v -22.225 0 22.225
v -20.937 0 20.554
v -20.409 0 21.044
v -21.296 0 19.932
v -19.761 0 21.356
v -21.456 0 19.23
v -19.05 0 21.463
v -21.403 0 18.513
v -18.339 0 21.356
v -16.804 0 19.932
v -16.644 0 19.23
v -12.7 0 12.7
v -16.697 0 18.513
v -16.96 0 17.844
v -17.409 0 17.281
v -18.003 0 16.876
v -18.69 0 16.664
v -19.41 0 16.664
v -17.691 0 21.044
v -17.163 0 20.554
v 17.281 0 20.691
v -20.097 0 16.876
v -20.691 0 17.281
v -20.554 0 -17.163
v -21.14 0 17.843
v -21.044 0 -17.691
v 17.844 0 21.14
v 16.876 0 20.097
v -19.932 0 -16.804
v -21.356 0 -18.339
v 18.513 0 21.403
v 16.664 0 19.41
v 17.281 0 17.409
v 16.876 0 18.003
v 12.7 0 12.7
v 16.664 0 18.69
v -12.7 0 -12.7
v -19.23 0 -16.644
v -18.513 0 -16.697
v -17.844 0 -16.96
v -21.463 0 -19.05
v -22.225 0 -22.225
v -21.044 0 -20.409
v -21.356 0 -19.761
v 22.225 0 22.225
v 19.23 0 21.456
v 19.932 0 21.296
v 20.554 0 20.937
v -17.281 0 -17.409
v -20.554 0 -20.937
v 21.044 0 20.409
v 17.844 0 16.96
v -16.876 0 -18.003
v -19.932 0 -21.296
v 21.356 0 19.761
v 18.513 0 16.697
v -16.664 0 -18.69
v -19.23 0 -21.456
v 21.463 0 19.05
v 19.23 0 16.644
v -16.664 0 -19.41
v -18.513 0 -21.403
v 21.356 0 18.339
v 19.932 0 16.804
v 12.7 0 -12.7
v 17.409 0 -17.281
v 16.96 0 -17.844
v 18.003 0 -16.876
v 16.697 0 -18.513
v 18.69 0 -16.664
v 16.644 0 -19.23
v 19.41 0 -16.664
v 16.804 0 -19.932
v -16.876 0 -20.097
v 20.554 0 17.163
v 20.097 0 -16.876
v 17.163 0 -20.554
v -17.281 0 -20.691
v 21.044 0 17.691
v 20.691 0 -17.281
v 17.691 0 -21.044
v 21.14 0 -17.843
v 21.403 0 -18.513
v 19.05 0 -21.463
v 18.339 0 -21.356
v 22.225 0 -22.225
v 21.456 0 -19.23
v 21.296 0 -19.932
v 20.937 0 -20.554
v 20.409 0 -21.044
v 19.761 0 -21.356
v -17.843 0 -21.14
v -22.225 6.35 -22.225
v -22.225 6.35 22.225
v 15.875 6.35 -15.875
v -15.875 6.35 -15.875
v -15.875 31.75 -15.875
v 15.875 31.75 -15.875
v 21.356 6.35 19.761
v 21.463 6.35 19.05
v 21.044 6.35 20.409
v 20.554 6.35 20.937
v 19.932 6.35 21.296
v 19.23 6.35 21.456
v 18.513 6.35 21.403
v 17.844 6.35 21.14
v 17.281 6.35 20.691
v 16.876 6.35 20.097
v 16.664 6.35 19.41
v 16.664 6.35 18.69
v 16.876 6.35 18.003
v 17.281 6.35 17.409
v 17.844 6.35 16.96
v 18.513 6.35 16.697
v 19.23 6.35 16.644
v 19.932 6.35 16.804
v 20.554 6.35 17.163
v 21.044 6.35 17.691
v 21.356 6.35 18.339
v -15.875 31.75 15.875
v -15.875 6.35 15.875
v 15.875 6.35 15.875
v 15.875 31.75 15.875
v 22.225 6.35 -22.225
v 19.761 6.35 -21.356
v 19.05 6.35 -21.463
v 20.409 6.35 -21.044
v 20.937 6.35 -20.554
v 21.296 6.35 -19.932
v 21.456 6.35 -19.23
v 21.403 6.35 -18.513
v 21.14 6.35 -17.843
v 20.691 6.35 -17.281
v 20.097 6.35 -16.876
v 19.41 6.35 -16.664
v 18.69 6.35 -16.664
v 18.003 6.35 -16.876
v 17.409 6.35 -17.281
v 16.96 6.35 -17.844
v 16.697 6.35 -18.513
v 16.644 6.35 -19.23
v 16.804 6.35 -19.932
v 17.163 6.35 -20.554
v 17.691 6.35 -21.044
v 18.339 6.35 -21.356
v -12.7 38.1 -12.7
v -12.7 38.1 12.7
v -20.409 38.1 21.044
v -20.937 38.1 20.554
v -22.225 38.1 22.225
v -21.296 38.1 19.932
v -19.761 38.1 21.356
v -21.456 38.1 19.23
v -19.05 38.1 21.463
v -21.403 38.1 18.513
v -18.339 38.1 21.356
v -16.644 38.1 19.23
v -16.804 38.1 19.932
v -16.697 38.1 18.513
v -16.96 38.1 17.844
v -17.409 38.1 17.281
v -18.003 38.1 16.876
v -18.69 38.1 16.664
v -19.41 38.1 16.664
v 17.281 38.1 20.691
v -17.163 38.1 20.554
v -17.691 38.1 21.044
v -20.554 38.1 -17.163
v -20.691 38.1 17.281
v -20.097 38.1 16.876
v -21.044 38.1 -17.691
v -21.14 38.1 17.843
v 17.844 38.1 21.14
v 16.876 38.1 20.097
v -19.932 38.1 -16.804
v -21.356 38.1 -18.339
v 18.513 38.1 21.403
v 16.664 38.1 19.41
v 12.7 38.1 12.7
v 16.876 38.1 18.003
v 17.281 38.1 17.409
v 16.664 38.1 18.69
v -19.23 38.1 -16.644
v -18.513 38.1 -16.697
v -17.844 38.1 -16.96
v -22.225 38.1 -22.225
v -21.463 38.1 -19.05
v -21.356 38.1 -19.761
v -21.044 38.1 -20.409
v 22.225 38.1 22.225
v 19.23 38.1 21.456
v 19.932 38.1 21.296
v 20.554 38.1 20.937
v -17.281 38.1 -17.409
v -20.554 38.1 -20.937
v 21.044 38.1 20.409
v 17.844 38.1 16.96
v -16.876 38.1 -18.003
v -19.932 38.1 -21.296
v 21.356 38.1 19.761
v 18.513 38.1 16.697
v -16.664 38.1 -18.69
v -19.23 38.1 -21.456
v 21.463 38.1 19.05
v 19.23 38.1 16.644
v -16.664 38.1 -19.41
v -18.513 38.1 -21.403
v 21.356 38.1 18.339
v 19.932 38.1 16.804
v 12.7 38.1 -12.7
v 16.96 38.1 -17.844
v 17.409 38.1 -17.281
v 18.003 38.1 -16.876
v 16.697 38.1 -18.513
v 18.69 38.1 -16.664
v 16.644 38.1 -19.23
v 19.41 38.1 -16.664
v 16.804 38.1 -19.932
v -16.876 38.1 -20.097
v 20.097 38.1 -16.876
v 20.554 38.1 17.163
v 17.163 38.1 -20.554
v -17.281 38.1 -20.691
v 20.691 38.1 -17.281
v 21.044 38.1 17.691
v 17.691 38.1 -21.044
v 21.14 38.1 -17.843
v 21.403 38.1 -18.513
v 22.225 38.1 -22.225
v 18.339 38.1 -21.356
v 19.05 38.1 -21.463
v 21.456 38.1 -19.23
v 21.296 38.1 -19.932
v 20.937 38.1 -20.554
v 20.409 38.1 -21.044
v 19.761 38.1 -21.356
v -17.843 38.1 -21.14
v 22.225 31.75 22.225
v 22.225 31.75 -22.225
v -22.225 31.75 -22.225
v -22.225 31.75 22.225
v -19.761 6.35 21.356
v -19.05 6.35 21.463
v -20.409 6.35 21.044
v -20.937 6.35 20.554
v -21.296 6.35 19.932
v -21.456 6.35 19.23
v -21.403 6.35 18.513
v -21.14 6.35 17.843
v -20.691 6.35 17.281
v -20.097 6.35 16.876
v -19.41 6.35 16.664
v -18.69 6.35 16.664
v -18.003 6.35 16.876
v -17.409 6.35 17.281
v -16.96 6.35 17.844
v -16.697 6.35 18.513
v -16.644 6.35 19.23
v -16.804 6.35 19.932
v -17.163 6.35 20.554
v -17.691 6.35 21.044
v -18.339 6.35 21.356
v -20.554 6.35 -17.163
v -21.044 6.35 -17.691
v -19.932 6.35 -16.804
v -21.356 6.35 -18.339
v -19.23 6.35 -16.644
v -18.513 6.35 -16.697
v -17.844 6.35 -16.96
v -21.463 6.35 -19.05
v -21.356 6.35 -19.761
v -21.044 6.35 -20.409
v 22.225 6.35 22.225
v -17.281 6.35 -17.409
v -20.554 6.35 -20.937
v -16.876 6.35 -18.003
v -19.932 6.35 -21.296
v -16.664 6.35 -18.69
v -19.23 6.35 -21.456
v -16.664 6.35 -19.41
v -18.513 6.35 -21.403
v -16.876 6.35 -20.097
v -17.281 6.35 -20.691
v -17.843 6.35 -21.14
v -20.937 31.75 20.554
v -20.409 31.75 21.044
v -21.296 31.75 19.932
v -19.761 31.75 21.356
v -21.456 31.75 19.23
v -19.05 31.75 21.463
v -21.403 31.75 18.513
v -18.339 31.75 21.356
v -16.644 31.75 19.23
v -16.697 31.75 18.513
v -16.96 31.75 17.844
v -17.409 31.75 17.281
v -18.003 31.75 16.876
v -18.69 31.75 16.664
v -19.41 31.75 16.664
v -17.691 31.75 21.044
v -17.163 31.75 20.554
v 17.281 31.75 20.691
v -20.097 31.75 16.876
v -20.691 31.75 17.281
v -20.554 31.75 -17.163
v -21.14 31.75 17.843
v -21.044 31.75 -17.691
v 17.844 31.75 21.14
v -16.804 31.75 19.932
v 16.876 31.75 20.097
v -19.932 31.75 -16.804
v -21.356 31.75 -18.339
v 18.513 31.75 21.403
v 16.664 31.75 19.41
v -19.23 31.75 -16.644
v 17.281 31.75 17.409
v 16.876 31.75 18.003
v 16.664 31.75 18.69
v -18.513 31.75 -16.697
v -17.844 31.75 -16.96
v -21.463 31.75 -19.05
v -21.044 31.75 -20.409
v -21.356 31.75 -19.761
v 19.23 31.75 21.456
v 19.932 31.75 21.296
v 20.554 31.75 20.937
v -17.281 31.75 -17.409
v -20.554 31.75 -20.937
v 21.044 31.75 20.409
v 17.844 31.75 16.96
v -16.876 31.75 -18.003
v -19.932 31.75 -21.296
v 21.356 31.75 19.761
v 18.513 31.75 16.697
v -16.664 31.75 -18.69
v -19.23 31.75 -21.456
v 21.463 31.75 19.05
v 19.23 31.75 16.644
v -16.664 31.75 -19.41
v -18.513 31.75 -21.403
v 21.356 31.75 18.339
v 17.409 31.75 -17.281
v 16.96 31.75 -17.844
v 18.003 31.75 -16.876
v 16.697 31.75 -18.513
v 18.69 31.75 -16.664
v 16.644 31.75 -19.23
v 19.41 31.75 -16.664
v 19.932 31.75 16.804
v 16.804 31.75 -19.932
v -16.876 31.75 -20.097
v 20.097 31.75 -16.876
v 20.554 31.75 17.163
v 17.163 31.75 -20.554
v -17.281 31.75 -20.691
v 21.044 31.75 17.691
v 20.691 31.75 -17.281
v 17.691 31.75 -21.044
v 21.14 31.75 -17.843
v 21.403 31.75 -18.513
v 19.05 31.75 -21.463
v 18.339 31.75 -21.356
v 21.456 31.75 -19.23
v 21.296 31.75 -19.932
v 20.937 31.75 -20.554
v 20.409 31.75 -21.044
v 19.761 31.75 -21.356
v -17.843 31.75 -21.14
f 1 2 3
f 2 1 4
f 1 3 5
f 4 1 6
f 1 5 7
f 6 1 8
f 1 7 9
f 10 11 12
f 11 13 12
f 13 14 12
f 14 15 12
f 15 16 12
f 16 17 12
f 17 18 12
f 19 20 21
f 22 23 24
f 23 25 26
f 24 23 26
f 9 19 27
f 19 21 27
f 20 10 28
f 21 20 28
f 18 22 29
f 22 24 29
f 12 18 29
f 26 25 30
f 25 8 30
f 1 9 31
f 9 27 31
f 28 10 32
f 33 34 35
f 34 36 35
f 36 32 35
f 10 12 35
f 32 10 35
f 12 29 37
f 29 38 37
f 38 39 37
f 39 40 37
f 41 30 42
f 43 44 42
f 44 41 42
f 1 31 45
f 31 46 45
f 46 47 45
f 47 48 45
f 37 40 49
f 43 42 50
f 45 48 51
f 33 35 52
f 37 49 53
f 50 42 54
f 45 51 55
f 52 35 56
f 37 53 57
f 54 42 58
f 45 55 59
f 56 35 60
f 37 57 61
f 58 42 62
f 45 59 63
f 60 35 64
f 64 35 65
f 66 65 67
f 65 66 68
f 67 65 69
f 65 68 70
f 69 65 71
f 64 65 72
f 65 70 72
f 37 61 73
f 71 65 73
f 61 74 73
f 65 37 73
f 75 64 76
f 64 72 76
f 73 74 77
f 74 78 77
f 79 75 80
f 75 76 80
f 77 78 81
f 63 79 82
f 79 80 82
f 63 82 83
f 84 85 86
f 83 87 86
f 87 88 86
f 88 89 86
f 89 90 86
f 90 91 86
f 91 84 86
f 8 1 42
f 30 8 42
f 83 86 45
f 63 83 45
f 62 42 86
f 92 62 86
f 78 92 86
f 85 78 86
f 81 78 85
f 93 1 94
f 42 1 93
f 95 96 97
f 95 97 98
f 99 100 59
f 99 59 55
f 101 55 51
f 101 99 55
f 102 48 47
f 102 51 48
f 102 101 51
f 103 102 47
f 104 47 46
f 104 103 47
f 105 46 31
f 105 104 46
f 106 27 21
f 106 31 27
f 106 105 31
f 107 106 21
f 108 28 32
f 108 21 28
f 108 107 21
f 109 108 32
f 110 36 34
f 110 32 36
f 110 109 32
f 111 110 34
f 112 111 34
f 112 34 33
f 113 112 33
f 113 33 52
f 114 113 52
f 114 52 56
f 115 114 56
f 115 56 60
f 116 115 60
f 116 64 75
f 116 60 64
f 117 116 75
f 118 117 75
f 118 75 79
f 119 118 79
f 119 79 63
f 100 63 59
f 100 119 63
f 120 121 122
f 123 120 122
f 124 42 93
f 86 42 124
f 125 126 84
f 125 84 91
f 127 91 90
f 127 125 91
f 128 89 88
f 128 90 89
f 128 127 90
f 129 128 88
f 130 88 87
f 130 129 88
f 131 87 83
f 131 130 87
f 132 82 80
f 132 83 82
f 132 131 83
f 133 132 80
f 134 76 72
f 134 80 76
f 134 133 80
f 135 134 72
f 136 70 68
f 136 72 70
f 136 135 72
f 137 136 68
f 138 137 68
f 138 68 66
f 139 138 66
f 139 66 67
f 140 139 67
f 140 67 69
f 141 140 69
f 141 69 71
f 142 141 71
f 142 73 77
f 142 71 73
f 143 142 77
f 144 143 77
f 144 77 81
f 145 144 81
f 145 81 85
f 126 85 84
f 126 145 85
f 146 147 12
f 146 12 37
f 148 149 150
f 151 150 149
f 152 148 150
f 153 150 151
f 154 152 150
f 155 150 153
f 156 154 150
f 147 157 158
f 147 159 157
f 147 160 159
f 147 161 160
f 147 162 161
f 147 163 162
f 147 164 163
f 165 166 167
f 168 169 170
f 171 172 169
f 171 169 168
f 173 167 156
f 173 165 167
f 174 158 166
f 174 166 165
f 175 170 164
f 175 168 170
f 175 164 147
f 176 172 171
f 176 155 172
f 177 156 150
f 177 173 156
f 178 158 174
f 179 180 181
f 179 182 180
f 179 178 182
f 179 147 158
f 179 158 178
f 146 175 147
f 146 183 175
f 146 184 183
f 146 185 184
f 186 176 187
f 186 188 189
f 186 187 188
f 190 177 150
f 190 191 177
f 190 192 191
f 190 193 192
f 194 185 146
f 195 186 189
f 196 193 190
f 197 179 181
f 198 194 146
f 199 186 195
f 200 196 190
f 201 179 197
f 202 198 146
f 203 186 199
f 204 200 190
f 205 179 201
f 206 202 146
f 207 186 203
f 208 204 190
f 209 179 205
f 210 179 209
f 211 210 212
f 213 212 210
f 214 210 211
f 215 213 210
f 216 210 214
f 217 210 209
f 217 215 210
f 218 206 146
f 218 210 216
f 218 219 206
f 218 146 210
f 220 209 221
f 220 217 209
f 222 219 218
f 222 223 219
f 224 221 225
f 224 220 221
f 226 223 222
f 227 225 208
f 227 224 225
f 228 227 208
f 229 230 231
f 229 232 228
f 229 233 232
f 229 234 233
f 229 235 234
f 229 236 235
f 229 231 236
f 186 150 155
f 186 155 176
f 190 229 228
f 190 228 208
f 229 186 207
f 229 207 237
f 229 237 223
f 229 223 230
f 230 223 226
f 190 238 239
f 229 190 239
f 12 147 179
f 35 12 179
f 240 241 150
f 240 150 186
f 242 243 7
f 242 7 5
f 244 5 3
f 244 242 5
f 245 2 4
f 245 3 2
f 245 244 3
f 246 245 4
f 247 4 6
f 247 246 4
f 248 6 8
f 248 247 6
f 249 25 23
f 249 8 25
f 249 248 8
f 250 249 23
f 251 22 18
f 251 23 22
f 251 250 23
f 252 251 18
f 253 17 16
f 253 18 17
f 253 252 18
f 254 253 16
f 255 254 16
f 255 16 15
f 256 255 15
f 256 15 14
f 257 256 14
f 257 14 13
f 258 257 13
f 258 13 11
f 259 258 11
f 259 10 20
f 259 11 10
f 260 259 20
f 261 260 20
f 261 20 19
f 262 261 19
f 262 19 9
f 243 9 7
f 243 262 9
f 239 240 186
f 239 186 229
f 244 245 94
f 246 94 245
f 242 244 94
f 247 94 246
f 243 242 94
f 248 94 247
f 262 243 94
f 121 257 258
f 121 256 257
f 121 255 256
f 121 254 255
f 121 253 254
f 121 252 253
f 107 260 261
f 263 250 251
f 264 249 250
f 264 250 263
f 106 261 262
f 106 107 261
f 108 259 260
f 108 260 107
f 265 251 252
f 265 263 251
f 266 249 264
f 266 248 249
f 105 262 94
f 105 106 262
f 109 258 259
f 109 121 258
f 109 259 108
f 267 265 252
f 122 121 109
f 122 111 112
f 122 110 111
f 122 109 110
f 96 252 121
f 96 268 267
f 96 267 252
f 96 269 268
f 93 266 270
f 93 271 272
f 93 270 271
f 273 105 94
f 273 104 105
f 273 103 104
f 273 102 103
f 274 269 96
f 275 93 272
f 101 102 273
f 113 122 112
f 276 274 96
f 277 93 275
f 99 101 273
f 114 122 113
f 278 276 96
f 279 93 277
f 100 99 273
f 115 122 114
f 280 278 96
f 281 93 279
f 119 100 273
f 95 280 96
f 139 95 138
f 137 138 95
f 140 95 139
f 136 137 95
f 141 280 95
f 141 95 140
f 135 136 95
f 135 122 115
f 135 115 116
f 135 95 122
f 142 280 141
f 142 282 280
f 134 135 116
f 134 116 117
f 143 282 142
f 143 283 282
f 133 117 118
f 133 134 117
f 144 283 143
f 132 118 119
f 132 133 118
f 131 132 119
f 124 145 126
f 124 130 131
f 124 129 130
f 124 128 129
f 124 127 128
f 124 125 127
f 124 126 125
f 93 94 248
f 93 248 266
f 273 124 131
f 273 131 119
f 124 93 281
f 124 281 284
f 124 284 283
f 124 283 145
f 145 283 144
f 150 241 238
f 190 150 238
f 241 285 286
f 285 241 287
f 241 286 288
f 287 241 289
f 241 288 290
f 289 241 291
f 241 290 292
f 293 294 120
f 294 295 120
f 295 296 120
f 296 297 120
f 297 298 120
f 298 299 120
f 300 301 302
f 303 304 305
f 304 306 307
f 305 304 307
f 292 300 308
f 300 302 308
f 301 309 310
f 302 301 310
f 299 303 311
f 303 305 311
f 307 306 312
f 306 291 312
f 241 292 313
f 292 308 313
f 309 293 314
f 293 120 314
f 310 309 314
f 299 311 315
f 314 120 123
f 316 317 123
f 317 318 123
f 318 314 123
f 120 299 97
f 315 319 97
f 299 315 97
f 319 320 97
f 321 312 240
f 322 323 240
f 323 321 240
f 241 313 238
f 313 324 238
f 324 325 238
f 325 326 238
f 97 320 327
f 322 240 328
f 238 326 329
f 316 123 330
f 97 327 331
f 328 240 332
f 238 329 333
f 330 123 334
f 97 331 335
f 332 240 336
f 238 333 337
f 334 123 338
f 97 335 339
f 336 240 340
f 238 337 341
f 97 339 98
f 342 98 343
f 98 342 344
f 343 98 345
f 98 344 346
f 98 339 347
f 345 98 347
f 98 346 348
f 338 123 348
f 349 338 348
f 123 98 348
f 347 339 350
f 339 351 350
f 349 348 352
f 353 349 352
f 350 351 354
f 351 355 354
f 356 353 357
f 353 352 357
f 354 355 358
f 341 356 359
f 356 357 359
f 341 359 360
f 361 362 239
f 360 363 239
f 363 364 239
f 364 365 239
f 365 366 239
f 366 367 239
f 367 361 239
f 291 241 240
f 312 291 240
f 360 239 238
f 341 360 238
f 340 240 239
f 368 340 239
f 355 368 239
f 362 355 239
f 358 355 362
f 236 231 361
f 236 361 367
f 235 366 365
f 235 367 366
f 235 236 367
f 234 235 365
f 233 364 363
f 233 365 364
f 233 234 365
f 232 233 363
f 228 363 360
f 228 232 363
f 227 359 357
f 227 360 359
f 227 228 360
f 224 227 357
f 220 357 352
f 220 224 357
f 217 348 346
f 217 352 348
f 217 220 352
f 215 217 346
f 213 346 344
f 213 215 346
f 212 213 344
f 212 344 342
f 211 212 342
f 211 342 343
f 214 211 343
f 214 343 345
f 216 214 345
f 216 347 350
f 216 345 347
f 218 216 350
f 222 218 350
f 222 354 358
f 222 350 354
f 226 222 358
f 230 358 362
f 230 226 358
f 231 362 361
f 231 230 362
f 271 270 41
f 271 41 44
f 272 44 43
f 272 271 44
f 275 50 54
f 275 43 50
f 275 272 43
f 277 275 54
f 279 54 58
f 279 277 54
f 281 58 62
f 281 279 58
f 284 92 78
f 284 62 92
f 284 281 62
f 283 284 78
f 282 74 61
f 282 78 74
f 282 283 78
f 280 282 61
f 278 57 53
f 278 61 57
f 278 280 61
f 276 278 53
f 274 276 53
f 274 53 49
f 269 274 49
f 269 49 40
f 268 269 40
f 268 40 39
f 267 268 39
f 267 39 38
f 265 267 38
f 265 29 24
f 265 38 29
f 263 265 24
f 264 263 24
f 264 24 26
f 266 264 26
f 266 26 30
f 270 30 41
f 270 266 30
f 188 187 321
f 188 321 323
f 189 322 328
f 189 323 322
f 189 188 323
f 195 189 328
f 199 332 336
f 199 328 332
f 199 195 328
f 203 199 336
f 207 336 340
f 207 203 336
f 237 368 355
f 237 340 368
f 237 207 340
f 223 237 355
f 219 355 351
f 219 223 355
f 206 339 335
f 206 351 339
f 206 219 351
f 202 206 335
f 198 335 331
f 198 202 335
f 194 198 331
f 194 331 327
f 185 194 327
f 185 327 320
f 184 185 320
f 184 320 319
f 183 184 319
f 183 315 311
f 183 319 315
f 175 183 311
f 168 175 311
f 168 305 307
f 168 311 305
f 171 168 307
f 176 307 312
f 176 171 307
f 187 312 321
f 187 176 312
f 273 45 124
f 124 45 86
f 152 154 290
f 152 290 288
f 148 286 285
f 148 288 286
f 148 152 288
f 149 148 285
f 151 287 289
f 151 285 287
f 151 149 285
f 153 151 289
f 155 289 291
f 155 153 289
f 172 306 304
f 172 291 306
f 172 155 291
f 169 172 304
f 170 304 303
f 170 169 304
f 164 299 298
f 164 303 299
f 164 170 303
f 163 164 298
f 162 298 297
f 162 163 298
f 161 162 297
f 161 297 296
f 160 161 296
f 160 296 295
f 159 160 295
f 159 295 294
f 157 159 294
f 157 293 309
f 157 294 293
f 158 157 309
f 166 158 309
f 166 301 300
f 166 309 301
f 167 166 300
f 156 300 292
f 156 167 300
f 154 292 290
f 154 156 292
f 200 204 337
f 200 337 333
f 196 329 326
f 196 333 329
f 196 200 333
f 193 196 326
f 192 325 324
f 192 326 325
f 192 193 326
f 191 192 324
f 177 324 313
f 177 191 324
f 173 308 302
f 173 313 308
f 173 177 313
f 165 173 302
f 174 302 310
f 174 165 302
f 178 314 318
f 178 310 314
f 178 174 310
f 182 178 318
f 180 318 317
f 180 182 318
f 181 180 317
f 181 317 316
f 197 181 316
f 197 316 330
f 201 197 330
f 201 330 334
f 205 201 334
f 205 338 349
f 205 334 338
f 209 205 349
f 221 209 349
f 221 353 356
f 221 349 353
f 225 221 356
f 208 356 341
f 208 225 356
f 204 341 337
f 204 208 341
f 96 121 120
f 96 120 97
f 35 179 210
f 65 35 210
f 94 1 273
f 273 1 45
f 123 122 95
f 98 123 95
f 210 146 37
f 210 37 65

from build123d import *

# Parameters (mm, degrees)
SKETCH1_W           = 44.45
SKETCH1_H           = 44.45
BOSS_EXTRUDE1_DEPTH = 6.35
SKETCH2_W           = 31.75
SKETCH2_H           = 31.75
BOSS_EXTRUDE2_DEPTH = 25.4
SKETCH3_W           = 44.45
SKETCH3_H           = 44.45
BOSS_EXTRUDE3_DEPTH = 6.35
SKETCH4_W           = 25.4
SKETCH4_H           = 25.4
CUT_EXTRUDE1_DEPTH  = 39.1
CUT_EXTRUDE3_START  = -7.35
SKETCH6_R           = 2.413
CUT_EXTRUDE3_DEPTH  = 40.1
CIRPATTERN1_COUNT   = 4


with BuildPart() as part:
    # Sketch1 → Boss-Extrude1 (new body)
    with BuildSketch(Plane(origin=(0, 0, 0), x_dir=(1, 0, 0), z_dir=(0, 1, 0))):
        Rectangle(SKETCH1_W, SKETCH1_H)
    extrude(amount=BOSS_EXTRUDE1_DEPTH)

    # Sketch2 → Boss-Extrude2 (add)
    with BuildSketch(Plane(origin=(0, 6.35, 0), x_dir=(1, 0, 0), z_dir=(0, 1, 0))):
        Rectangle(SKETCH2_W, SKETCH2_H)
    extrude(amount=BOSS_EXTRUDE2_DEPTH)

    # Sketch3 → Boss-Extrude3 (add)
    with BuildSketch(Plane(origin=(0, 31.75, 0), x_dir=(1, 0, 0), z_dir=(0, 1, 0))):
        Rectangle(SKETCH3_W, SKETCH3_H)
    extrude(amount=BOSS_EXTRUDE3_DEPTH)

    # Sketch4 → Cut-Extrude1 (cut, through all)
    with BuildSketch(Plane(origin=(0, 38.1, 0), x_dir=(1, 0, 0), z_dir=(0, 1, 0))):
        Rectangle(SKETCH4_W, SKETCH4_H)
    extrude(amount=-CUT_EXTRUDE1_DEPTH, mode=Mode.SUBTRACT)

    # Sketch6 → Cut-Extrude3 (cut)
    with BuildSketch(Plane.XZ.offset(-31.75).offset(CUT_EXTRUDE3_START)):
        with Locations((19.05, 19.05)):
            Circle(SKETCH6_R)
    cut_extrude3 = extrude(amount=CUT_EXTRUDE3_DEPTH, mode=Mode.SUBTRACT)

    # CirPattern1: Cut-Extrude3 ×4 about axis
    cirpattern1_axis = Axis((0, 0, 0), (0, 1, 0))
    for i in range(1, CIRPATTERN1_COUNT):
        add(cut_extrude3.rotate(cirpattern1_axis, i * 360 / CIRPATTERN1_COUNT), mode=Mode.SUBTRACT)


solid = part.part
